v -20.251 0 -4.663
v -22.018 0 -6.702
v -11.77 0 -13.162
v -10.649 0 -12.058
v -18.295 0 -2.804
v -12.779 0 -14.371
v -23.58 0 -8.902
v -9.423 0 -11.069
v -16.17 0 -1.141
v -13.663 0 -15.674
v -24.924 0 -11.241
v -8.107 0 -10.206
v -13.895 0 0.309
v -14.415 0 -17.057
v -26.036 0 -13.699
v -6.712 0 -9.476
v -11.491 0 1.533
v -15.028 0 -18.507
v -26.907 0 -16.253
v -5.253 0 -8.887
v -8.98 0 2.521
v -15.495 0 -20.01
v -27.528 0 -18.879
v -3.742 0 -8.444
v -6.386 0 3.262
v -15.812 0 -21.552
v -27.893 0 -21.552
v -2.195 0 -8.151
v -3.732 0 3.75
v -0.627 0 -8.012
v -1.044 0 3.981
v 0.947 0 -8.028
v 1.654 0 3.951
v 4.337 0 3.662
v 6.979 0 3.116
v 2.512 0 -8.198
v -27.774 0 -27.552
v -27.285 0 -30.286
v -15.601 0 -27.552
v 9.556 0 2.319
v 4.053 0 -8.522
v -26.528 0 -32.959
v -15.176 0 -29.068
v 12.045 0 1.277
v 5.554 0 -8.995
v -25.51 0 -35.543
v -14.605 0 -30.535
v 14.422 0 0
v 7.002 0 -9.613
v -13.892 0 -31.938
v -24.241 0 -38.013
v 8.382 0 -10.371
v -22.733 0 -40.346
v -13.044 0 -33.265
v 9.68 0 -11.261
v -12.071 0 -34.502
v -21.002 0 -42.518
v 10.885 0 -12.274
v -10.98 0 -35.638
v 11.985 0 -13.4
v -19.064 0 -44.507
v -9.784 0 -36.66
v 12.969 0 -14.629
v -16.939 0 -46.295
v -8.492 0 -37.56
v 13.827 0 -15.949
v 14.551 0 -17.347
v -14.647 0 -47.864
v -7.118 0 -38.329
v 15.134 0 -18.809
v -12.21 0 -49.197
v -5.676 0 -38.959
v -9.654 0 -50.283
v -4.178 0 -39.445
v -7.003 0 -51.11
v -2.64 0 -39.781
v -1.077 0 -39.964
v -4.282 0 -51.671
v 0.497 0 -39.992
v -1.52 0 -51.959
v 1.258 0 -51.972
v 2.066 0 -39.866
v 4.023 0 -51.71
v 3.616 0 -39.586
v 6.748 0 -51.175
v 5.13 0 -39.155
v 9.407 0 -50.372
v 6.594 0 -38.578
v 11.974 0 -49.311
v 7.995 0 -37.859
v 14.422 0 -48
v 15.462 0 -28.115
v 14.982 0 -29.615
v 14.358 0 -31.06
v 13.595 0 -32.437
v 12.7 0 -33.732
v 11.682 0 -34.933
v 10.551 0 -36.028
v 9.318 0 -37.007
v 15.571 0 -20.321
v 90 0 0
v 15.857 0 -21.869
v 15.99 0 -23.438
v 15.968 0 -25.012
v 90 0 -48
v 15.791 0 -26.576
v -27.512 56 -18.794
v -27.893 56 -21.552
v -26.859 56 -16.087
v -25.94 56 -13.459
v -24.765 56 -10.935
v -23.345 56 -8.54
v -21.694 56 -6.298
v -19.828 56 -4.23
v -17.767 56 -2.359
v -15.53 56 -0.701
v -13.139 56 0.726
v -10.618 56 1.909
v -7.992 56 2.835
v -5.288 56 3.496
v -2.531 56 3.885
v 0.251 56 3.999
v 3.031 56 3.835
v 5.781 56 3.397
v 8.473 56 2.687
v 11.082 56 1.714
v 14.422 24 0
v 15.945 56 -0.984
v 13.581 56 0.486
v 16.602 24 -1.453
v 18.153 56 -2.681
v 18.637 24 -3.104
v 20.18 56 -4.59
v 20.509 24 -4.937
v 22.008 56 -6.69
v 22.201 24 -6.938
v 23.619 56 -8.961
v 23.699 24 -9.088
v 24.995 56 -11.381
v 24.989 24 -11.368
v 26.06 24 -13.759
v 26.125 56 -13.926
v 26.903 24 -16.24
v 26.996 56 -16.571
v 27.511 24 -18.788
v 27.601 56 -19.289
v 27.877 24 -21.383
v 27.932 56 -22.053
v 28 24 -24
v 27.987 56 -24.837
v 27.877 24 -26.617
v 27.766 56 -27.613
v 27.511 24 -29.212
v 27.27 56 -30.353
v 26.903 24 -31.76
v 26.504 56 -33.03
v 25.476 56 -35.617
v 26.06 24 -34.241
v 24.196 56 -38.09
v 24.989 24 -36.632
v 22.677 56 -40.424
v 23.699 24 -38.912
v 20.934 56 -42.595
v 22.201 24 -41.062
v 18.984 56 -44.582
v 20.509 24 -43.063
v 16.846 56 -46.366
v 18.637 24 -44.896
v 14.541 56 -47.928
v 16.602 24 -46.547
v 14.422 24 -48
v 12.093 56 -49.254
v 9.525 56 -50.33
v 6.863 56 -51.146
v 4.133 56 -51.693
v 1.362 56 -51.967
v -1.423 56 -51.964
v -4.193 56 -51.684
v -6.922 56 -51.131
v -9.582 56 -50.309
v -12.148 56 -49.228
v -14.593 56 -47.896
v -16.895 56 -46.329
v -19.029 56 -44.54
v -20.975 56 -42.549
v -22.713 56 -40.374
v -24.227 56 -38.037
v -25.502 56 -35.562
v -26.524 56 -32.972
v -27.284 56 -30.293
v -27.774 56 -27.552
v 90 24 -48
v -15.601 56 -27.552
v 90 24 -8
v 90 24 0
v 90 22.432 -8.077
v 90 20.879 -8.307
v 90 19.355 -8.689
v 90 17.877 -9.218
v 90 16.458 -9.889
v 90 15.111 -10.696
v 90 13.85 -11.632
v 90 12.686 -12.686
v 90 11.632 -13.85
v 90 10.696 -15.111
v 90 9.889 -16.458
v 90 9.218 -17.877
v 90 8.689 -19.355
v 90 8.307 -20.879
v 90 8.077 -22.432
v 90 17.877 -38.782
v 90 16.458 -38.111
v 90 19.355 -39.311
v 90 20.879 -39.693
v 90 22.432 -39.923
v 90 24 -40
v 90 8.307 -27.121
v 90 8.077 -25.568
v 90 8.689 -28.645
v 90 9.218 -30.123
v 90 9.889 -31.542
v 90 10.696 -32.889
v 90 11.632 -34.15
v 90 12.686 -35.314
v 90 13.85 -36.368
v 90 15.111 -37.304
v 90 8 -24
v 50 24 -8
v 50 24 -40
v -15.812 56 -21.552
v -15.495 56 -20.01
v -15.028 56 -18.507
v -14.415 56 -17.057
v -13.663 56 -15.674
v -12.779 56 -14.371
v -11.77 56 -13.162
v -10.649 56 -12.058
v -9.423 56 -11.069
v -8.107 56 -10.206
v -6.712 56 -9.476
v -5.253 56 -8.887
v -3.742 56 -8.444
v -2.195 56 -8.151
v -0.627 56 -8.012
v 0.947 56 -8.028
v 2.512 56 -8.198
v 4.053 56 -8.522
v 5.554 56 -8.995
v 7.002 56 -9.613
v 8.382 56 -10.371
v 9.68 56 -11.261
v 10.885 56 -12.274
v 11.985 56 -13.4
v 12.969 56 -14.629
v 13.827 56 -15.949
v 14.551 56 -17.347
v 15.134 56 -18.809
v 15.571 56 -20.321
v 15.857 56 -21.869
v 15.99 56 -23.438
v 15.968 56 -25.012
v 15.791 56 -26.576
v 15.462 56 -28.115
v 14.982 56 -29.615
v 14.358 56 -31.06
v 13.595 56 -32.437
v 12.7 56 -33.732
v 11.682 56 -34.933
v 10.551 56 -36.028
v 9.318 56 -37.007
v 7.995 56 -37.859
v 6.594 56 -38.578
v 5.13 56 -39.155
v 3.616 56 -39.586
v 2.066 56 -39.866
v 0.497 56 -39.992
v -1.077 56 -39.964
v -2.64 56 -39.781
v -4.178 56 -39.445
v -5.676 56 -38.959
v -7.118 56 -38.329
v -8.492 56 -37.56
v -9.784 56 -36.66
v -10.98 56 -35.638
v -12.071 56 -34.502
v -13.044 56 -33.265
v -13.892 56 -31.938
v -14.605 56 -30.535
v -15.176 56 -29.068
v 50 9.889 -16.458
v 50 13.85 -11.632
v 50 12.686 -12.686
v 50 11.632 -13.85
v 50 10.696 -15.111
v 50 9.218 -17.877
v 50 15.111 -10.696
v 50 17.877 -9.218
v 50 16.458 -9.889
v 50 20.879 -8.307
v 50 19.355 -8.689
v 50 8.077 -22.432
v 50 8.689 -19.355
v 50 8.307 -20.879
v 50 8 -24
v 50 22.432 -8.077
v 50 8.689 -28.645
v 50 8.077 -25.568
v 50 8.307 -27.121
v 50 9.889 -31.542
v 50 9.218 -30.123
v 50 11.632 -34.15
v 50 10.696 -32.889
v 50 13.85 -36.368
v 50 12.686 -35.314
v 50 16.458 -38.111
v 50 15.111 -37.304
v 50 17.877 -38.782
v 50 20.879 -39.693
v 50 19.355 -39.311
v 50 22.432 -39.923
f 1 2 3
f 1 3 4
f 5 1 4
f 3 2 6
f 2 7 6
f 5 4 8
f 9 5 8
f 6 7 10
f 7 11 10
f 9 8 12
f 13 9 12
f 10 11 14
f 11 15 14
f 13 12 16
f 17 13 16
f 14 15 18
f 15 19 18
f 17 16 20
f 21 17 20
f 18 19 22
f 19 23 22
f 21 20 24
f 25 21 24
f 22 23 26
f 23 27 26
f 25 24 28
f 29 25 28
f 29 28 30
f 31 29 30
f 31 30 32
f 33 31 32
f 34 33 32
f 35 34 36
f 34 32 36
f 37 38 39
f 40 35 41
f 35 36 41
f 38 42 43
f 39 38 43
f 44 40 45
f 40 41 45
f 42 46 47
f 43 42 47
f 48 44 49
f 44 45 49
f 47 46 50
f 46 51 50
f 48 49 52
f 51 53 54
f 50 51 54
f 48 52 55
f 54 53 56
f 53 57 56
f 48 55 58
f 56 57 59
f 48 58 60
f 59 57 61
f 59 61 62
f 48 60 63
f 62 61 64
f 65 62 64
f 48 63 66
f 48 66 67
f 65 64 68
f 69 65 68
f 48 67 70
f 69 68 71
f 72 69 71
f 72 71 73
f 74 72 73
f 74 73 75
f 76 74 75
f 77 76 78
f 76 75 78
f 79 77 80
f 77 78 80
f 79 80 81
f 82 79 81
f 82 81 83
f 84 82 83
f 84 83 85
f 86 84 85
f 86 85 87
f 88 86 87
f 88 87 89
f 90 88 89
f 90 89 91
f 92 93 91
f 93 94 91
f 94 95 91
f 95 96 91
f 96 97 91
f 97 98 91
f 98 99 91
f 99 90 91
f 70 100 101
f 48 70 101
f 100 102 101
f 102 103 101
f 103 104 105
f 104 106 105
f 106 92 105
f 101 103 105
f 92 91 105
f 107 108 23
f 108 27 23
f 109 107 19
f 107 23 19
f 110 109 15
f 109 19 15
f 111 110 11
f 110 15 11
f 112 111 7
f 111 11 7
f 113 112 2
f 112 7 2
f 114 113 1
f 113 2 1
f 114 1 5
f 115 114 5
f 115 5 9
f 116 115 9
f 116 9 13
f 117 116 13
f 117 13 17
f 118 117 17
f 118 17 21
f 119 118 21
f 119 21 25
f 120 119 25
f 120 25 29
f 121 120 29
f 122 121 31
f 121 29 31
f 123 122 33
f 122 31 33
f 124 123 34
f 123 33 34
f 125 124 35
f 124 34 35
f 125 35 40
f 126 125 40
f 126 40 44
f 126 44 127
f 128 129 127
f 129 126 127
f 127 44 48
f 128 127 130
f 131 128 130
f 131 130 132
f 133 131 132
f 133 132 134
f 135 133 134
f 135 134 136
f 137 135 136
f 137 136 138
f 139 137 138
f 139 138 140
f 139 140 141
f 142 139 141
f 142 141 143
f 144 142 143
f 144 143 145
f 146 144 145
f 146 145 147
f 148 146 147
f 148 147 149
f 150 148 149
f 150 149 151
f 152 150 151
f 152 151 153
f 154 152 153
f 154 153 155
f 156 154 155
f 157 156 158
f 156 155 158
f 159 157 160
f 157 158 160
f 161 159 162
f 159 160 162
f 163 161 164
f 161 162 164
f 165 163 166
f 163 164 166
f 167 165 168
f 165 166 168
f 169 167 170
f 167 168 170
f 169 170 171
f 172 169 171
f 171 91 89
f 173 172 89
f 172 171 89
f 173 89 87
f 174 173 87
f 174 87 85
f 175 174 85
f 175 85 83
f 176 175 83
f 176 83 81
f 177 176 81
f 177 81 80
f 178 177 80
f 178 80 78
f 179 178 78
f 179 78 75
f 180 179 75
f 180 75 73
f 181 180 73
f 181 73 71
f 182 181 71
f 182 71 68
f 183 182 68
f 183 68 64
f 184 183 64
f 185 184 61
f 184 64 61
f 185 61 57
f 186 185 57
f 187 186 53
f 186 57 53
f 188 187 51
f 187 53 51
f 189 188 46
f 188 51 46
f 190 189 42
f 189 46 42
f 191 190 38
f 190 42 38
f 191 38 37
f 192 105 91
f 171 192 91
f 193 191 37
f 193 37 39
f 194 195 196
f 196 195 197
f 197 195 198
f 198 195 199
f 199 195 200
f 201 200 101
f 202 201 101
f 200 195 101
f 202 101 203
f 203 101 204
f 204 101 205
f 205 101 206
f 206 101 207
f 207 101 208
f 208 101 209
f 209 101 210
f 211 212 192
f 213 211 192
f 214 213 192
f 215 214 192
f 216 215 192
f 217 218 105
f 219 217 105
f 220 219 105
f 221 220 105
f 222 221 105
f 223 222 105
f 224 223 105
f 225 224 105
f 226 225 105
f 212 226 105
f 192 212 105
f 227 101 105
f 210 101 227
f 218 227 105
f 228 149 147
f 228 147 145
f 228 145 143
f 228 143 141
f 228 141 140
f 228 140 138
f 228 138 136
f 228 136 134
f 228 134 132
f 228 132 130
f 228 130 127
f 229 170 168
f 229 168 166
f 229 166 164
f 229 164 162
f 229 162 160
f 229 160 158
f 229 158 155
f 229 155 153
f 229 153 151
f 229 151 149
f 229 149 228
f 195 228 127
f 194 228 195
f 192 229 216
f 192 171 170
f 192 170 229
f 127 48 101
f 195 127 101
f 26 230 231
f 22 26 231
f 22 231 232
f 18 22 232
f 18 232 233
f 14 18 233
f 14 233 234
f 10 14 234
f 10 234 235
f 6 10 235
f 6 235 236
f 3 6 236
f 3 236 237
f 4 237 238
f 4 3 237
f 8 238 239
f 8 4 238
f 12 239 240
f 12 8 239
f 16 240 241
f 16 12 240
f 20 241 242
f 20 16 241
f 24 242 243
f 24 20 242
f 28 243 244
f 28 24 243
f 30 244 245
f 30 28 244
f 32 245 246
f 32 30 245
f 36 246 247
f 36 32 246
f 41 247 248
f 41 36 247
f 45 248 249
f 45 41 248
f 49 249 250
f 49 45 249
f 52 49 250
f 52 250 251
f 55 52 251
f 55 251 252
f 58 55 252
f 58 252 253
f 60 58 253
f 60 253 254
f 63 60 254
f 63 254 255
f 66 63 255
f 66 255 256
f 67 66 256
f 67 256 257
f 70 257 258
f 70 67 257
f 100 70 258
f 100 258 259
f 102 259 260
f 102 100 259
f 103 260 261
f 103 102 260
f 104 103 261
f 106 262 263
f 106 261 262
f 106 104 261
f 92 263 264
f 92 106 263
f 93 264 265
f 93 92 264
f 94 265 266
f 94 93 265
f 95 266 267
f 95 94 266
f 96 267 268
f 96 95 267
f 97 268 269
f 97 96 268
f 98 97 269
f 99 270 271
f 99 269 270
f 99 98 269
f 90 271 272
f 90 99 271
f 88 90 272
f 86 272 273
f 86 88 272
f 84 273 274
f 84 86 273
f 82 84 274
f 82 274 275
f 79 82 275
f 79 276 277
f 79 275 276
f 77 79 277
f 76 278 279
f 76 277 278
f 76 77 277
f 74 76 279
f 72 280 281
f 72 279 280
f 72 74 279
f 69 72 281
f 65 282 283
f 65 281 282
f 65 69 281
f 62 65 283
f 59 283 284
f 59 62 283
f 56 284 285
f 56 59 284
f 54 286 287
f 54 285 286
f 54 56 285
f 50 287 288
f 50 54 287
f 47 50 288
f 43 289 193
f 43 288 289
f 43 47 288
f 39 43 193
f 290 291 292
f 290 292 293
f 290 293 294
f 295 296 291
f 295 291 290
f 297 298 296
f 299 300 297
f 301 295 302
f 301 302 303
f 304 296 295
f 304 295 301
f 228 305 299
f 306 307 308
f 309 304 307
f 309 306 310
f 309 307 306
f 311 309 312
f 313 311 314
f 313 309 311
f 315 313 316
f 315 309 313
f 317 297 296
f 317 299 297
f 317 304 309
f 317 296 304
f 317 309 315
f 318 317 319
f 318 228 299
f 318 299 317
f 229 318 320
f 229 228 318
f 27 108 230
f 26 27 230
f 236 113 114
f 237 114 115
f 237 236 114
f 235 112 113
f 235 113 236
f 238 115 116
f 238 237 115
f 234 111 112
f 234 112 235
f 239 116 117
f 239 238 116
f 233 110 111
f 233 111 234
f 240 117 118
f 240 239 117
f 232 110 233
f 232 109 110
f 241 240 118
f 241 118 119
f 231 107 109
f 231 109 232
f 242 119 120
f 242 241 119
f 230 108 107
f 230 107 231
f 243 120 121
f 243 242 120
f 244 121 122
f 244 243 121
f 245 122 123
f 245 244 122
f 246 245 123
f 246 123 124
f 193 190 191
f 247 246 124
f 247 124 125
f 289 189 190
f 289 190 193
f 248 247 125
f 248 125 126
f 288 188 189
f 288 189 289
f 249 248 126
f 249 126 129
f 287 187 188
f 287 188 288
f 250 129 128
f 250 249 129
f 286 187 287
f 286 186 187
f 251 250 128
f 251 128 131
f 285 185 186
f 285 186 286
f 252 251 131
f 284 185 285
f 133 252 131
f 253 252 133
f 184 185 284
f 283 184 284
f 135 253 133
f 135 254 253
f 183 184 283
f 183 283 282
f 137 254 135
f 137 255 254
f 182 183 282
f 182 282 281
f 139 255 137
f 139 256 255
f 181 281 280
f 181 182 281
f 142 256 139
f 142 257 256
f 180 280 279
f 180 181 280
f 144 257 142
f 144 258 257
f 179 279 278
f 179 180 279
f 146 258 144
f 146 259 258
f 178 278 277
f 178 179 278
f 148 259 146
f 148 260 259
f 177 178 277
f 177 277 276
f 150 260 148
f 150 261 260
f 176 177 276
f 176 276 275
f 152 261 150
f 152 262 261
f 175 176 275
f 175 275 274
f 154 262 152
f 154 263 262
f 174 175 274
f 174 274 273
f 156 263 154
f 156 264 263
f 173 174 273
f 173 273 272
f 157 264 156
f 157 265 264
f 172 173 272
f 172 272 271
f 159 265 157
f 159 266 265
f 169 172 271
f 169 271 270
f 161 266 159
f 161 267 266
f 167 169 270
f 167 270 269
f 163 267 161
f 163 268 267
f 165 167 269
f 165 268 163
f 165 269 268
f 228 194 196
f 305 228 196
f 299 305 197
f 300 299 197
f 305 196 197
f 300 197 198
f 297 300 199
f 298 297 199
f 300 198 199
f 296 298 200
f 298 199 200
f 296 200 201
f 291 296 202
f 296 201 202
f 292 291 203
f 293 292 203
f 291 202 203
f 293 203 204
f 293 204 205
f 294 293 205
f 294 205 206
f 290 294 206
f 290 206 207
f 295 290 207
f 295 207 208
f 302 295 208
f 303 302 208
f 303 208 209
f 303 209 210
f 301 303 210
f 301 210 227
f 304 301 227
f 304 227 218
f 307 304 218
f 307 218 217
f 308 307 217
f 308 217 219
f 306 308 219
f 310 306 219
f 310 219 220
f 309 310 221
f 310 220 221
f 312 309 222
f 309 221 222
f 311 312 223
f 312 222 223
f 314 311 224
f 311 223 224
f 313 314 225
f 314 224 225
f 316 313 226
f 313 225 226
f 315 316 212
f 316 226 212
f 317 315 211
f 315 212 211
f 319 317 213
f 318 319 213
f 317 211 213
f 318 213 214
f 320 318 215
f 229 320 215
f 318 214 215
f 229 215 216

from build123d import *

# Parameters (mm, degrees)
BOSS_EXTRUDE1_DEPTH = 24
SKETCH1_4_R         = 16
BOSS_EXTRUDE2_DEPTH = 56
SKETCH2_W           = 38.610961688
SKETCH2_H           = 6
CUT_EXTRUDE1_DEPTH  = 119.067777145
SKETCH3_R           = 16
CUT_EXTRUDE2_DEPTH  = 40


with BuildPart() as part:
    # Sketch1 → Boss-Extrude1 (new body)
    with BuildSketch(Plane(origin=(0, 0, 0), x_dir=(1, 0, 0), z_dir=(0, 1, 0))):
        with BuildLine():
            ThreePointArc((28, 24), (24.37028665, 10.212718594), (14.422205102, 0))
            Line((14.422205102, 0), (90, 0))
            Line((90, 0), (90, 48))
            Line((90, 48), (14.422205102, 48))
            ThreePointArc((14.422205102, 48), (24.37028665, 37.787281406), (28, 24))
        make_face()
    extrude(amount=BOSS_EXTRUDE1_DEPTH)

    # Sketch1<4> → Boss-Extrude2 (add)
    with BuildSketch(Plane(origin=(0, 0, 0), x_dir=(1, 0, 0), z_dir=(0, 1, 0))):
        with BuildLine():
            ThreePointArc((14.422205102, 48), (-28, 24), (14.422205102, 0))
            ThreePointArc((14.422205102, 0), (24.37028665, 10.212718594), (28, 24))
            ThreePointArc((28, 24), (24.37028665, 37.787281406), (14.422205102, 48))
        make_face()
        with Locations((0, 24)):
            Circle(SKETCH1_4_R, mode=Mode.SUBTRACT)
    extrude(amount=BOSS_EXTRUDE2_DEPTH)

    # Sketch2 → Cut-Extrude1 (cut, through all)
    with BuildSketch(Plane(origin=(0, 56, 0), x_dir=(1, 0, 0), z_dir=(0, 1, 0))):
        with Locations((-21.356464049, 24.552208475)):
            Rectangle(SKETCH2_W, SKETCH2_H)
    extrude(amount=-CUT_EXTRUDE1_DEPTH, mode=Mode.SUBTRACT)

    # Sketch3 → Cut-Extrude2 (cut)
    with BuildSketch(Plane(origin=(90, 0, 0), x_dir=(0, 0, -1), z_dir=(1, 0, 0))):
        with Locations((24, 24)):
            Circle(SKETCH3_R)
    extrude(amount=-CUT_EXTRUDE2_DEPTH, mode=Mode.SUBTRACT)


solid = part.part
